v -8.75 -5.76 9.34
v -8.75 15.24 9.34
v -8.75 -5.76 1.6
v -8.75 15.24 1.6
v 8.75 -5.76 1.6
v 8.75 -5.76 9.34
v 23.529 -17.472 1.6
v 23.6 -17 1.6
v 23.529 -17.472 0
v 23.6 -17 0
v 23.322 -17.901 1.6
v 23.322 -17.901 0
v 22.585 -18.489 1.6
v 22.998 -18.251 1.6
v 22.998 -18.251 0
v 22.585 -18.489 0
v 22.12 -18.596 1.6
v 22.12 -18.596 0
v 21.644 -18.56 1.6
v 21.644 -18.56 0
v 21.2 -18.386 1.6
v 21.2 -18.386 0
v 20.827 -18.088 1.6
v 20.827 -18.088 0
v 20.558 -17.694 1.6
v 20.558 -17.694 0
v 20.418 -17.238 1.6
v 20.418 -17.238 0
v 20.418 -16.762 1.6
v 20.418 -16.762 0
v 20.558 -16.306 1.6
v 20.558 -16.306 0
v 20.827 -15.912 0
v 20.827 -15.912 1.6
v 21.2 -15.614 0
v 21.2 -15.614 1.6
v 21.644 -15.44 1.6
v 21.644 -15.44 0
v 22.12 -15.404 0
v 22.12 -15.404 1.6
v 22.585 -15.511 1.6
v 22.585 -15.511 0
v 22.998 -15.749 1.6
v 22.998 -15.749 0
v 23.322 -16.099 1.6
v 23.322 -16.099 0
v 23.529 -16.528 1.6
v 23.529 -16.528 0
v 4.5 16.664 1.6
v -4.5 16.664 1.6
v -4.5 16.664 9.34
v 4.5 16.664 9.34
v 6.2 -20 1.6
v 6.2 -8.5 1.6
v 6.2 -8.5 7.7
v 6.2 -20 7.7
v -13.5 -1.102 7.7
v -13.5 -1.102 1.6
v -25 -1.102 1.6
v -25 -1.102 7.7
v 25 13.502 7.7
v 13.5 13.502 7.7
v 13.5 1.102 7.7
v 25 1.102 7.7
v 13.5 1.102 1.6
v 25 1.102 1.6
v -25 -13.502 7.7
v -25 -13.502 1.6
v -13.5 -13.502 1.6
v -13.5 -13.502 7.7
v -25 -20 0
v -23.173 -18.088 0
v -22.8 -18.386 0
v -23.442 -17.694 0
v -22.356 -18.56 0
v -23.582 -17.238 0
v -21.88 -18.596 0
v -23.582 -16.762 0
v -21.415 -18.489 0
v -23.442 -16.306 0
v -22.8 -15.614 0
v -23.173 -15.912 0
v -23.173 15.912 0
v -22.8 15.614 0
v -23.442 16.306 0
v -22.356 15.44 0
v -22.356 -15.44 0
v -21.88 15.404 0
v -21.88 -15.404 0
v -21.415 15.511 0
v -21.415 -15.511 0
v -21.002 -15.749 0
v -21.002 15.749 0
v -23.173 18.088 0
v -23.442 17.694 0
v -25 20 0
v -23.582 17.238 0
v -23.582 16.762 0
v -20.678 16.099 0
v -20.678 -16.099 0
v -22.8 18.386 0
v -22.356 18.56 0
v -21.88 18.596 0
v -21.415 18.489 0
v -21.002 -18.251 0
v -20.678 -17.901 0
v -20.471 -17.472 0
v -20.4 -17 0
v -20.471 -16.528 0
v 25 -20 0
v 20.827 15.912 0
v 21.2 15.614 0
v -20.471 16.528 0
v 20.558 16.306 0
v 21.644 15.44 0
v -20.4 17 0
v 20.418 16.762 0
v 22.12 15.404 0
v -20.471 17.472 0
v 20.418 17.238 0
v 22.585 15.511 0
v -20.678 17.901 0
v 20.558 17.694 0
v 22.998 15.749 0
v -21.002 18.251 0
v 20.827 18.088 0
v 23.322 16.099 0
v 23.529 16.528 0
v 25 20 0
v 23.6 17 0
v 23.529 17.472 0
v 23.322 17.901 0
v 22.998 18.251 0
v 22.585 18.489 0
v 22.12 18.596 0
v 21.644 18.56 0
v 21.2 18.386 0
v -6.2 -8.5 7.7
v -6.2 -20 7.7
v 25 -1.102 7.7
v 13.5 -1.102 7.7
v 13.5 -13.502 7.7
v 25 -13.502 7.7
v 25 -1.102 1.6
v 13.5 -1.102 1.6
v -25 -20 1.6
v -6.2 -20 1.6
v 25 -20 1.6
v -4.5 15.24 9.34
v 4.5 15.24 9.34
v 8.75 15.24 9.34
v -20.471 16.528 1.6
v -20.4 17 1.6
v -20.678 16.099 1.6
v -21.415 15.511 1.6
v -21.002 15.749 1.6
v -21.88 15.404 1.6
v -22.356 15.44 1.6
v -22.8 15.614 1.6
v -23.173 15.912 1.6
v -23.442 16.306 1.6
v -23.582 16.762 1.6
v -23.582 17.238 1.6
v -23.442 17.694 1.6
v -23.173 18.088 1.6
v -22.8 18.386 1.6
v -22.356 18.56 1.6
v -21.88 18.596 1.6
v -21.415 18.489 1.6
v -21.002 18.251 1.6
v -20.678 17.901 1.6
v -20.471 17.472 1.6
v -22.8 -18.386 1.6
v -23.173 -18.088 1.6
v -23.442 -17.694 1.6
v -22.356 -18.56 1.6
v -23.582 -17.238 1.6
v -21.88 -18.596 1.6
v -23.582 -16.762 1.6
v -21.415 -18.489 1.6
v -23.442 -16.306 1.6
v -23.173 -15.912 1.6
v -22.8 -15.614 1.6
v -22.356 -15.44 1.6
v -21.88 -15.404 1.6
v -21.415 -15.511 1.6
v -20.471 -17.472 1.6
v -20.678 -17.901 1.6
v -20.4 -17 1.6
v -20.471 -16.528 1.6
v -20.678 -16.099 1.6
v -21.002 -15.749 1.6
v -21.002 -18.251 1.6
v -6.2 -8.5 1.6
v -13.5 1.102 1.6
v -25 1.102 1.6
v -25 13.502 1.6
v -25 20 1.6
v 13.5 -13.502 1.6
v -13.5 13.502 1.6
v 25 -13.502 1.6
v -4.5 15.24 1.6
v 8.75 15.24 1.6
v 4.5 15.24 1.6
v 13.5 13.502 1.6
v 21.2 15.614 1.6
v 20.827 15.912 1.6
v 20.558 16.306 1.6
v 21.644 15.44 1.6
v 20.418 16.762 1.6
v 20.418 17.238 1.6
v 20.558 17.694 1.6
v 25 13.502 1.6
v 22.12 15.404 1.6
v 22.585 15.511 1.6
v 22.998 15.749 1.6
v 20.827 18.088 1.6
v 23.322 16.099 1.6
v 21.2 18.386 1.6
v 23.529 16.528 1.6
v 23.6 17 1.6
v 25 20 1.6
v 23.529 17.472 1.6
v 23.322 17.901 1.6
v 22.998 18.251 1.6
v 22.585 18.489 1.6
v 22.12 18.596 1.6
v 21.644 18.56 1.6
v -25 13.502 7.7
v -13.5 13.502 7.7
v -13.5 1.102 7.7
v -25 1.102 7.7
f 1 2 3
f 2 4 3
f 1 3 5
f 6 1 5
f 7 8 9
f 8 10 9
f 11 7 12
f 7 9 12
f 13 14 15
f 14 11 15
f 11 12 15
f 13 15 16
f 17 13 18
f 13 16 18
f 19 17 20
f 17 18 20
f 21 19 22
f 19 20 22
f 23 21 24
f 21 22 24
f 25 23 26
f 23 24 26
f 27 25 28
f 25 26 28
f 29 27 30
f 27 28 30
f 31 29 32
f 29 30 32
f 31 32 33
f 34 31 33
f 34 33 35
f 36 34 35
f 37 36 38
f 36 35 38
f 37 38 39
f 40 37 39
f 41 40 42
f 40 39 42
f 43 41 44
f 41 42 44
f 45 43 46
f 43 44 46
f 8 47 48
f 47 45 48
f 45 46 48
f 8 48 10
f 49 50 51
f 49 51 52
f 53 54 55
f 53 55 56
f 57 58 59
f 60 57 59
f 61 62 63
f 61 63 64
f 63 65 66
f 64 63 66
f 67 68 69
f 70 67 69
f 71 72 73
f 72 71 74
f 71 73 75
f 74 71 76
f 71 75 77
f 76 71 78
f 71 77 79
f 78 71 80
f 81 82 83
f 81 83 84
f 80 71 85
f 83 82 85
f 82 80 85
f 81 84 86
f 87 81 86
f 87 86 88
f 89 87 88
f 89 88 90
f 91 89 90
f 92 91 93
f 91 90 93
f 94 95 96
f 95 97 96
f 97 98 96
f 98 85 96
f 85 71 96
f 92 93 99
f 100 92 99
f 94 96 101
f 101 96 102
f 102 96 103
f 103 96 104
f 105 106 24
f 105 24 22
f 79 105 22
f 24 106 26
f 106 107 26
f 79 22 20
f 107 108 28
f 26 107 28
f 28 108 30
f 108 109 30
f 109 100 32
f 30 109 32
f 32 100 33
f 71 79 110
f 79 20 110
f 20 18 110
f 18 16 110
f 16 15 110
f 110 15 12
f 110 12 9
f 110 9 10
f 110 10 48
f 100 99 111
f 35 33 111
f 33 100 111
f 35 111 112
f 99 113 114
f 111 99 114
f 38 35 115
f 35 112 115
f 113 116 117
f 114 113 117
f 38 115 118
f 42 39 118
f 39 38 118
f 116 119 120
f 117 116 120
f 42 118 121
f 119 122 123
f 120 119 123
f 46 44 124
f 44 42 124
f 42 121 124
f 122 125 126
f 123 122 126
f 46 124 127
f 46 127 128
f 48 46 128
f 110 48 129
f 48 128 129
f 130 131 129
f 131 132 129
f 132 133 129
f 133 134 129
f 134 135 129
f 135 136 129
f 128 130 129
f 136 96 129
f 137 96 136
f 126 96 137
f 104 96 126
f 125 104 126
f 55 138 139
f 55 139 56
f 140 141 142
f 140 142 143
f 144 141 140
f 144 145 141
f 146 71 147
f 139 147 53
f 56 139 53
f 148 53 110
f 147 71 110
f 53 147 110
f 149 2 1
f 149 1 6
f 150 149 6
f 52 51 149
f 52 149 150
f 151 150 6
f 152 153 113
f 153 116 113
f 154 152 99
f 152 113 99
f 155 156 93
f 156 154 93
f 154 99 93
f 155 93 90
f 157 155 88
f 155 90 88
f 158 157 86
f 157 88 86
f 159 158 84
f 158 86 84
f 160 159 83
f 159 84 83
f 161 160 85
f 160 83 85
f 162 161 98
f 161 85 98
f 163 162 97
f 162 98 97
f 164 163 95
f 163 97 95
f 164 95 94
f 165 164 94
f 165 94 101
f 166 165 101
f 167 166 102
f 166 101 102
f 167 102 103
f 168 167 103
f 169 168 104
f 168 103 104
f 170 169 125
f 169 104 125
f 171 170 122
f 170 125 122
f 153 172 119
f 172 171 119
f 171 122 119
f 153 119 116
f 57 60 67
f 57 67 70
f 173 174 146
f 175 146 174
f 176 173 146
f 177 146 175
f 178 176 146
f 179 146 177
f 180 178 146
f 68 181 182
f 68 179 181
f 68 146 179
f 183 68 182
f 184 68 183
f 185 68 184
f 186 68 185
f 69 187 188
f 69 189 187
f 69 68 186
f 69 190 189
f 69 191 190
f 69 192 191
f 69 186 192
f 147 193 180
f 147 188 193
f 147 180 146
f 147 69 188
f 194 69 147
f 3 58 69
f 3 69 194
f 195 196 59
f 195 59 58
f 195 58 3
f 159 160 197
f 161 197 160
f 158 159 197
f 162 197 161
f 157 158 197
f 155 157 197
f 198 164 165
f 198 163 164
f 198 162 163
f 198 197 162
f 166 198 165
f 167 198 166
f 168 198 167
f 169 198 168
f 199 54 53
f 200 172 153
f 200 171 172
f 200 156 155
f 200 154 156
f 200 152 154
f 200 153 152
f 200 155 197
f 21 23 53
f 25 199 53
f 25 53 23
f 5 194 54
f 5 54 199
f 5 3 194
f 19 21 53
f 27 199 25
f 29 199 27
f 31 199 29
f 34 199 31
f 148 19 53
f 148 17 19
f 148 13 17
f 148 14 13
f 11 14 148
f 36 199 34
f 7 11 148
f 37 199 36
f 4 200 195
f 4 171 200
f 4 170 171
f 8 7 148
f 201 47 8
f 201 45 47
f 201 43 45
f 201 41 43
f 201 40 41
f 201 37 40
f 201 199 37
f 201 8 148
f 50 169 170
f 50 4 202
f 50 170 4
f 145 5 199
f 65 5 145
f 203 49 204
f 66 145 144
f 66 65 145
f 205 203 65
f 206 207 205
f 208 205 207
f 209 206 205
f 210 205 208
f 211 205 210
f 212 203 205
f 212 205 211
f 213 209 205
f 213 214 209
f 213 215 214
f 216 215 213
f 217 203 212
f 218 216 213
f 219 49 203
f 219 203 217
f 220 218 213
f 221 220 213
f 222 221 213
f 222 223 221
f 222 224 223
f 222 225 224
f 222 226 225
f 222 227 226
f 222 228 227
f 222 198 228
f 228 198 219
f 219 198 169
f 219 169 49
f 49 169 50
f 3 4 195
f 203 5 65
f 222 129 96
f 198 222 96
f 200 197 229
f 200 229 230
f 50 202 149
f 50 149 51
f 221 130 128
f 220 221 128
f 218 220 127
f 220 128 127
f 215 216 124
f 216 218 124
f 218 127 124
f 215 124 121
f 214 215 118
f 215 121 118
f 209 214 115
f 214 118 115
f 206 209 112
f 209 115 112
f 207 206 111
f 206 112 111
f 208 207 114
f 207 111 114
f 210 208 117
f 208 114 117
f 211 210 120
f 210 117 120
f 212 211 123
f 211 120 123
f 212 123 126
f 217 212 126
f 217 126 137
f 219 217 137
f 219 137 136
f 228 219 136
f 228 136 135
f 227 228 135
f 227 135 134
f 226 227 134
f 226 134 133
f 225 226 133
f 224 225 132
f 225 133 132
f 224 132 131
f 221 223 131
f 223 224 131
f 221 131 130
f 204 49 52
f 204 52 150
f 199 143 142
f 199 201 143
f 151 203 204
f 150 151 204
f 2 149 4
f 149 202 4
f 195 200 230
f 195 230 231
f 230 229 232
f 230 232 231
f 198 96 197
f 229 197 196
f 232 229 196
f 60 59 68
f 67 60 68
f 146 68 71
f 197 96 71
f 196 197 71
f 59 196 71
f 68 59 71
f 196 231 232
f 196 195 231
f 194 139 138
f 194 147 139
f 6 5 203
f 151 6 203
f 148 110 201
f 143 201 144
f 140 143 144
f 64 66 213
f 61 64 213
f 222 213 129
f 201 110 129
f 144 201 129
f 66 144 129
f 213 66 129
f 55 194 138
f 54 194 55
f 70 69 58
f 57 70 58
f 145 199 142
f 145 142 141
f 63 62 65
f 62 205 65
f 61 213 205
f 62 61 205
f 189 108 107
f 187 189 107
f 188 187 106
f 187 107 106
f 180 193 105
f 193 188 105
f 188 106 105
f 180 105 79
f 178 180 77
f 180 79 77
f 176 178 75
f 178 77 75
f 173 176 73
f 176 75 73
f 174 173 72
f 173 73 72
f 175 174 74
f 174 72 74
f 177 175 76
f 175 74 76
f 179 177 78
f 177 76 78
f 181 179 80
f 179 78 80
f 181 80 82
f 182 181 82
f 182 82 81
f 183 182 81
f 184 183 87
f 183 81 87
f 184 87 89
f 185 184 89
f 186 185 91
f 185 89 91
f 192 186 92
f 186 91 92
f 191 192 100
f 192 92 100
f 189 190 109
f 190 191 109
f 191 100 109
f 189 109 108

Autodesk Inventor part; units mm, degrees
ref_plane "YZ Plane" through (0, 0, 0) normal (1, 0, 0) x (0, 1, 0)
ref_plane "XZ Plane" through (0, 0, 0) normal (0, 1, 0) x (-1, 0, 0)
ref_plane "XY Plane" through (0, 0, 0) normal (0, 0, 1) x (1, 0, 0)
sketch "スケッチ1" plane through (0, 0, 0) normal (0, 0, 1) x (1, 0, 0)
  line L0 (-25, -20) -> (25, -20)
  line L1 (25, -20) -> (25, 20)
  line L2 (25, 20) -> (-25, 20)
  line L3 (-25, 20) -> (-25, -20)
  line L4 (-25, -20) -> (25, 20) construction
  line L5 (25, -20) -> (-25, 20) construction
  line L6 (-22, -17) -> (22, -17) construction
  line L7 (22, -17) -> (22, 17) construction
  line L8 (22, 17) -> (-22, 17) construction
  line L9 (-22, 17) -> (-22, -17) construction
  line L10 (-22, -17) -> (22, 17) construction
  line L11 (22, -17) -> (-22, 17) construction
  circle A0 centre (-22, -17) radius 1.6
  circle A1 centre (-22, 17) radius 1.6
  circle A2 centre (22, -17) radius 1.6
  circle A3 centre (22, 17) radius 1.6
  line L12 (-25, -13.5025) -> (-13.5, -13.5025)
  line L13 (-13.5, -13.5025) -> (-13.5, -1.1025)
  line L14 (-13.5, -1.1025) -> (-25, -1.1025)
  line L15 (-6.2, -20) -> (-6.2, -8.5)
  line L16 (-6.2, -8.5) -> (6.2, -8.5)
  line L17 (6.2, -8.5) -> (6.2, -20)
  line L18 (-25, 0) -> (25, 0) construction
  line L19 (0, -20) -> (0, 20) construction
  line L20 (-25, 13.5025) -> (-13.5, 13.5025)
  line L21 (-13.5, 13.5025) -> (-13.5, 1.1025)
  line L22 (-13.5, 1.1025) -> (-25, 1.1025)
  line L23 (25, -13.5025) -> (13.5, -13.5025)
  line L24 (13.5, -13.5025) -> (13.5, -1.1025)
  line L25 (13.5, -1.1025) -> (25, -1.1025)
  line L26 (13.5, 1.1025) -> (25, 1.1025)
  line L27 (13.5, 13.5025) -> (13.5, 1.1025)
  line L28 (25, 13.5025) -> (13.5, 13.5025)
  line L29 (-8.75, -5.76) -> (8.75, -5.76)
  line L30 (8.75, -5.76) -> (8.75, 15.24)
  line L31 (8.75, 15.24) -> (-8.75, 15.24)
  line L32 (-8.75, 15.24) -> (-8.75, -5.76)
  line L33 (-8.75, -5.76) -> (8.75, 15.24) construction
  line L34 (8.75, -5.76) -> (-8.75, 15.24) construction
  line L35 (-4.5, 15.24) -> (-4.5, 16.664)
  line L36 (-4.5, 16.664) -> (4.5, 16.664)
  line L37 (4.5, 16.664) -> (4.5, 15.24)
  point P0 (0, 0)
  point P1 (-13.5, -7.3025)
  point P2 (0, -8.5)
  point P3 (0, 4.74)
  point P4 (0, 16.664)
  point P5 (0, 4.74)
  dimension "d0" = 50
  dimension "d1" = 40
  dimension "d2" = 44
  dimension "d3" = 34
  dimension "d4" = 3.2
  dimension "d5" = 3.2
  dimension "d6" = 3.2
  dimension "d7" = 3.2
  dimension "d8" = 11.5
  dimension "d9" = 12.4
  dimension "d10" = 7.3025
  dimension "d11" = 11.5
  dimension "d12" = 12.4
  dimension "d17" = 17.5
  dimension "d18" = 21
  dimension "d19" = 9
  dimension "d20" = 1.424
  dimension "d21" = 15.26
extrude "押し出し1" add sketch "スケッチ1" along normal blind 1.6 contours L3 L12 L13 L14 L22 L21 L20 L2 L1 L28 L27 L26 L25 L24 L23 L0 L17 L16 L15 | L15 L16 L17 L0 | L3 L14 L13 L12 | L3 L20 L21 L22 | L23 L24 L25 L1 | L26 L27 L28 L1 | L32 L31 L30 L29 | L35 L36 L37 L31
extrude "押し出し2" add sketch "スケッチ1" along normal blind 7.7 contours L15 L16 L17 L0 | L3 L14 L13 L12 | L3 L20 L21 L22 | L23 L24 L25 L1 | L26 L27 L28 L1
extrude "押し出し3" add sketch "スケッチ1" along normal blind 9.34 contours L32 L31 L30 L29 | L35 L36 L37 L31
equation "\"d5\" = d4"
equation "\"d6\" = d4"
equation "\"d7\" = d4"
equation "\"d11\" = d8"
equation "\"d12\" = d9"
properties part number "Quad-Load-Cell-Amplifier-to-RS-485-Conv-Module"
